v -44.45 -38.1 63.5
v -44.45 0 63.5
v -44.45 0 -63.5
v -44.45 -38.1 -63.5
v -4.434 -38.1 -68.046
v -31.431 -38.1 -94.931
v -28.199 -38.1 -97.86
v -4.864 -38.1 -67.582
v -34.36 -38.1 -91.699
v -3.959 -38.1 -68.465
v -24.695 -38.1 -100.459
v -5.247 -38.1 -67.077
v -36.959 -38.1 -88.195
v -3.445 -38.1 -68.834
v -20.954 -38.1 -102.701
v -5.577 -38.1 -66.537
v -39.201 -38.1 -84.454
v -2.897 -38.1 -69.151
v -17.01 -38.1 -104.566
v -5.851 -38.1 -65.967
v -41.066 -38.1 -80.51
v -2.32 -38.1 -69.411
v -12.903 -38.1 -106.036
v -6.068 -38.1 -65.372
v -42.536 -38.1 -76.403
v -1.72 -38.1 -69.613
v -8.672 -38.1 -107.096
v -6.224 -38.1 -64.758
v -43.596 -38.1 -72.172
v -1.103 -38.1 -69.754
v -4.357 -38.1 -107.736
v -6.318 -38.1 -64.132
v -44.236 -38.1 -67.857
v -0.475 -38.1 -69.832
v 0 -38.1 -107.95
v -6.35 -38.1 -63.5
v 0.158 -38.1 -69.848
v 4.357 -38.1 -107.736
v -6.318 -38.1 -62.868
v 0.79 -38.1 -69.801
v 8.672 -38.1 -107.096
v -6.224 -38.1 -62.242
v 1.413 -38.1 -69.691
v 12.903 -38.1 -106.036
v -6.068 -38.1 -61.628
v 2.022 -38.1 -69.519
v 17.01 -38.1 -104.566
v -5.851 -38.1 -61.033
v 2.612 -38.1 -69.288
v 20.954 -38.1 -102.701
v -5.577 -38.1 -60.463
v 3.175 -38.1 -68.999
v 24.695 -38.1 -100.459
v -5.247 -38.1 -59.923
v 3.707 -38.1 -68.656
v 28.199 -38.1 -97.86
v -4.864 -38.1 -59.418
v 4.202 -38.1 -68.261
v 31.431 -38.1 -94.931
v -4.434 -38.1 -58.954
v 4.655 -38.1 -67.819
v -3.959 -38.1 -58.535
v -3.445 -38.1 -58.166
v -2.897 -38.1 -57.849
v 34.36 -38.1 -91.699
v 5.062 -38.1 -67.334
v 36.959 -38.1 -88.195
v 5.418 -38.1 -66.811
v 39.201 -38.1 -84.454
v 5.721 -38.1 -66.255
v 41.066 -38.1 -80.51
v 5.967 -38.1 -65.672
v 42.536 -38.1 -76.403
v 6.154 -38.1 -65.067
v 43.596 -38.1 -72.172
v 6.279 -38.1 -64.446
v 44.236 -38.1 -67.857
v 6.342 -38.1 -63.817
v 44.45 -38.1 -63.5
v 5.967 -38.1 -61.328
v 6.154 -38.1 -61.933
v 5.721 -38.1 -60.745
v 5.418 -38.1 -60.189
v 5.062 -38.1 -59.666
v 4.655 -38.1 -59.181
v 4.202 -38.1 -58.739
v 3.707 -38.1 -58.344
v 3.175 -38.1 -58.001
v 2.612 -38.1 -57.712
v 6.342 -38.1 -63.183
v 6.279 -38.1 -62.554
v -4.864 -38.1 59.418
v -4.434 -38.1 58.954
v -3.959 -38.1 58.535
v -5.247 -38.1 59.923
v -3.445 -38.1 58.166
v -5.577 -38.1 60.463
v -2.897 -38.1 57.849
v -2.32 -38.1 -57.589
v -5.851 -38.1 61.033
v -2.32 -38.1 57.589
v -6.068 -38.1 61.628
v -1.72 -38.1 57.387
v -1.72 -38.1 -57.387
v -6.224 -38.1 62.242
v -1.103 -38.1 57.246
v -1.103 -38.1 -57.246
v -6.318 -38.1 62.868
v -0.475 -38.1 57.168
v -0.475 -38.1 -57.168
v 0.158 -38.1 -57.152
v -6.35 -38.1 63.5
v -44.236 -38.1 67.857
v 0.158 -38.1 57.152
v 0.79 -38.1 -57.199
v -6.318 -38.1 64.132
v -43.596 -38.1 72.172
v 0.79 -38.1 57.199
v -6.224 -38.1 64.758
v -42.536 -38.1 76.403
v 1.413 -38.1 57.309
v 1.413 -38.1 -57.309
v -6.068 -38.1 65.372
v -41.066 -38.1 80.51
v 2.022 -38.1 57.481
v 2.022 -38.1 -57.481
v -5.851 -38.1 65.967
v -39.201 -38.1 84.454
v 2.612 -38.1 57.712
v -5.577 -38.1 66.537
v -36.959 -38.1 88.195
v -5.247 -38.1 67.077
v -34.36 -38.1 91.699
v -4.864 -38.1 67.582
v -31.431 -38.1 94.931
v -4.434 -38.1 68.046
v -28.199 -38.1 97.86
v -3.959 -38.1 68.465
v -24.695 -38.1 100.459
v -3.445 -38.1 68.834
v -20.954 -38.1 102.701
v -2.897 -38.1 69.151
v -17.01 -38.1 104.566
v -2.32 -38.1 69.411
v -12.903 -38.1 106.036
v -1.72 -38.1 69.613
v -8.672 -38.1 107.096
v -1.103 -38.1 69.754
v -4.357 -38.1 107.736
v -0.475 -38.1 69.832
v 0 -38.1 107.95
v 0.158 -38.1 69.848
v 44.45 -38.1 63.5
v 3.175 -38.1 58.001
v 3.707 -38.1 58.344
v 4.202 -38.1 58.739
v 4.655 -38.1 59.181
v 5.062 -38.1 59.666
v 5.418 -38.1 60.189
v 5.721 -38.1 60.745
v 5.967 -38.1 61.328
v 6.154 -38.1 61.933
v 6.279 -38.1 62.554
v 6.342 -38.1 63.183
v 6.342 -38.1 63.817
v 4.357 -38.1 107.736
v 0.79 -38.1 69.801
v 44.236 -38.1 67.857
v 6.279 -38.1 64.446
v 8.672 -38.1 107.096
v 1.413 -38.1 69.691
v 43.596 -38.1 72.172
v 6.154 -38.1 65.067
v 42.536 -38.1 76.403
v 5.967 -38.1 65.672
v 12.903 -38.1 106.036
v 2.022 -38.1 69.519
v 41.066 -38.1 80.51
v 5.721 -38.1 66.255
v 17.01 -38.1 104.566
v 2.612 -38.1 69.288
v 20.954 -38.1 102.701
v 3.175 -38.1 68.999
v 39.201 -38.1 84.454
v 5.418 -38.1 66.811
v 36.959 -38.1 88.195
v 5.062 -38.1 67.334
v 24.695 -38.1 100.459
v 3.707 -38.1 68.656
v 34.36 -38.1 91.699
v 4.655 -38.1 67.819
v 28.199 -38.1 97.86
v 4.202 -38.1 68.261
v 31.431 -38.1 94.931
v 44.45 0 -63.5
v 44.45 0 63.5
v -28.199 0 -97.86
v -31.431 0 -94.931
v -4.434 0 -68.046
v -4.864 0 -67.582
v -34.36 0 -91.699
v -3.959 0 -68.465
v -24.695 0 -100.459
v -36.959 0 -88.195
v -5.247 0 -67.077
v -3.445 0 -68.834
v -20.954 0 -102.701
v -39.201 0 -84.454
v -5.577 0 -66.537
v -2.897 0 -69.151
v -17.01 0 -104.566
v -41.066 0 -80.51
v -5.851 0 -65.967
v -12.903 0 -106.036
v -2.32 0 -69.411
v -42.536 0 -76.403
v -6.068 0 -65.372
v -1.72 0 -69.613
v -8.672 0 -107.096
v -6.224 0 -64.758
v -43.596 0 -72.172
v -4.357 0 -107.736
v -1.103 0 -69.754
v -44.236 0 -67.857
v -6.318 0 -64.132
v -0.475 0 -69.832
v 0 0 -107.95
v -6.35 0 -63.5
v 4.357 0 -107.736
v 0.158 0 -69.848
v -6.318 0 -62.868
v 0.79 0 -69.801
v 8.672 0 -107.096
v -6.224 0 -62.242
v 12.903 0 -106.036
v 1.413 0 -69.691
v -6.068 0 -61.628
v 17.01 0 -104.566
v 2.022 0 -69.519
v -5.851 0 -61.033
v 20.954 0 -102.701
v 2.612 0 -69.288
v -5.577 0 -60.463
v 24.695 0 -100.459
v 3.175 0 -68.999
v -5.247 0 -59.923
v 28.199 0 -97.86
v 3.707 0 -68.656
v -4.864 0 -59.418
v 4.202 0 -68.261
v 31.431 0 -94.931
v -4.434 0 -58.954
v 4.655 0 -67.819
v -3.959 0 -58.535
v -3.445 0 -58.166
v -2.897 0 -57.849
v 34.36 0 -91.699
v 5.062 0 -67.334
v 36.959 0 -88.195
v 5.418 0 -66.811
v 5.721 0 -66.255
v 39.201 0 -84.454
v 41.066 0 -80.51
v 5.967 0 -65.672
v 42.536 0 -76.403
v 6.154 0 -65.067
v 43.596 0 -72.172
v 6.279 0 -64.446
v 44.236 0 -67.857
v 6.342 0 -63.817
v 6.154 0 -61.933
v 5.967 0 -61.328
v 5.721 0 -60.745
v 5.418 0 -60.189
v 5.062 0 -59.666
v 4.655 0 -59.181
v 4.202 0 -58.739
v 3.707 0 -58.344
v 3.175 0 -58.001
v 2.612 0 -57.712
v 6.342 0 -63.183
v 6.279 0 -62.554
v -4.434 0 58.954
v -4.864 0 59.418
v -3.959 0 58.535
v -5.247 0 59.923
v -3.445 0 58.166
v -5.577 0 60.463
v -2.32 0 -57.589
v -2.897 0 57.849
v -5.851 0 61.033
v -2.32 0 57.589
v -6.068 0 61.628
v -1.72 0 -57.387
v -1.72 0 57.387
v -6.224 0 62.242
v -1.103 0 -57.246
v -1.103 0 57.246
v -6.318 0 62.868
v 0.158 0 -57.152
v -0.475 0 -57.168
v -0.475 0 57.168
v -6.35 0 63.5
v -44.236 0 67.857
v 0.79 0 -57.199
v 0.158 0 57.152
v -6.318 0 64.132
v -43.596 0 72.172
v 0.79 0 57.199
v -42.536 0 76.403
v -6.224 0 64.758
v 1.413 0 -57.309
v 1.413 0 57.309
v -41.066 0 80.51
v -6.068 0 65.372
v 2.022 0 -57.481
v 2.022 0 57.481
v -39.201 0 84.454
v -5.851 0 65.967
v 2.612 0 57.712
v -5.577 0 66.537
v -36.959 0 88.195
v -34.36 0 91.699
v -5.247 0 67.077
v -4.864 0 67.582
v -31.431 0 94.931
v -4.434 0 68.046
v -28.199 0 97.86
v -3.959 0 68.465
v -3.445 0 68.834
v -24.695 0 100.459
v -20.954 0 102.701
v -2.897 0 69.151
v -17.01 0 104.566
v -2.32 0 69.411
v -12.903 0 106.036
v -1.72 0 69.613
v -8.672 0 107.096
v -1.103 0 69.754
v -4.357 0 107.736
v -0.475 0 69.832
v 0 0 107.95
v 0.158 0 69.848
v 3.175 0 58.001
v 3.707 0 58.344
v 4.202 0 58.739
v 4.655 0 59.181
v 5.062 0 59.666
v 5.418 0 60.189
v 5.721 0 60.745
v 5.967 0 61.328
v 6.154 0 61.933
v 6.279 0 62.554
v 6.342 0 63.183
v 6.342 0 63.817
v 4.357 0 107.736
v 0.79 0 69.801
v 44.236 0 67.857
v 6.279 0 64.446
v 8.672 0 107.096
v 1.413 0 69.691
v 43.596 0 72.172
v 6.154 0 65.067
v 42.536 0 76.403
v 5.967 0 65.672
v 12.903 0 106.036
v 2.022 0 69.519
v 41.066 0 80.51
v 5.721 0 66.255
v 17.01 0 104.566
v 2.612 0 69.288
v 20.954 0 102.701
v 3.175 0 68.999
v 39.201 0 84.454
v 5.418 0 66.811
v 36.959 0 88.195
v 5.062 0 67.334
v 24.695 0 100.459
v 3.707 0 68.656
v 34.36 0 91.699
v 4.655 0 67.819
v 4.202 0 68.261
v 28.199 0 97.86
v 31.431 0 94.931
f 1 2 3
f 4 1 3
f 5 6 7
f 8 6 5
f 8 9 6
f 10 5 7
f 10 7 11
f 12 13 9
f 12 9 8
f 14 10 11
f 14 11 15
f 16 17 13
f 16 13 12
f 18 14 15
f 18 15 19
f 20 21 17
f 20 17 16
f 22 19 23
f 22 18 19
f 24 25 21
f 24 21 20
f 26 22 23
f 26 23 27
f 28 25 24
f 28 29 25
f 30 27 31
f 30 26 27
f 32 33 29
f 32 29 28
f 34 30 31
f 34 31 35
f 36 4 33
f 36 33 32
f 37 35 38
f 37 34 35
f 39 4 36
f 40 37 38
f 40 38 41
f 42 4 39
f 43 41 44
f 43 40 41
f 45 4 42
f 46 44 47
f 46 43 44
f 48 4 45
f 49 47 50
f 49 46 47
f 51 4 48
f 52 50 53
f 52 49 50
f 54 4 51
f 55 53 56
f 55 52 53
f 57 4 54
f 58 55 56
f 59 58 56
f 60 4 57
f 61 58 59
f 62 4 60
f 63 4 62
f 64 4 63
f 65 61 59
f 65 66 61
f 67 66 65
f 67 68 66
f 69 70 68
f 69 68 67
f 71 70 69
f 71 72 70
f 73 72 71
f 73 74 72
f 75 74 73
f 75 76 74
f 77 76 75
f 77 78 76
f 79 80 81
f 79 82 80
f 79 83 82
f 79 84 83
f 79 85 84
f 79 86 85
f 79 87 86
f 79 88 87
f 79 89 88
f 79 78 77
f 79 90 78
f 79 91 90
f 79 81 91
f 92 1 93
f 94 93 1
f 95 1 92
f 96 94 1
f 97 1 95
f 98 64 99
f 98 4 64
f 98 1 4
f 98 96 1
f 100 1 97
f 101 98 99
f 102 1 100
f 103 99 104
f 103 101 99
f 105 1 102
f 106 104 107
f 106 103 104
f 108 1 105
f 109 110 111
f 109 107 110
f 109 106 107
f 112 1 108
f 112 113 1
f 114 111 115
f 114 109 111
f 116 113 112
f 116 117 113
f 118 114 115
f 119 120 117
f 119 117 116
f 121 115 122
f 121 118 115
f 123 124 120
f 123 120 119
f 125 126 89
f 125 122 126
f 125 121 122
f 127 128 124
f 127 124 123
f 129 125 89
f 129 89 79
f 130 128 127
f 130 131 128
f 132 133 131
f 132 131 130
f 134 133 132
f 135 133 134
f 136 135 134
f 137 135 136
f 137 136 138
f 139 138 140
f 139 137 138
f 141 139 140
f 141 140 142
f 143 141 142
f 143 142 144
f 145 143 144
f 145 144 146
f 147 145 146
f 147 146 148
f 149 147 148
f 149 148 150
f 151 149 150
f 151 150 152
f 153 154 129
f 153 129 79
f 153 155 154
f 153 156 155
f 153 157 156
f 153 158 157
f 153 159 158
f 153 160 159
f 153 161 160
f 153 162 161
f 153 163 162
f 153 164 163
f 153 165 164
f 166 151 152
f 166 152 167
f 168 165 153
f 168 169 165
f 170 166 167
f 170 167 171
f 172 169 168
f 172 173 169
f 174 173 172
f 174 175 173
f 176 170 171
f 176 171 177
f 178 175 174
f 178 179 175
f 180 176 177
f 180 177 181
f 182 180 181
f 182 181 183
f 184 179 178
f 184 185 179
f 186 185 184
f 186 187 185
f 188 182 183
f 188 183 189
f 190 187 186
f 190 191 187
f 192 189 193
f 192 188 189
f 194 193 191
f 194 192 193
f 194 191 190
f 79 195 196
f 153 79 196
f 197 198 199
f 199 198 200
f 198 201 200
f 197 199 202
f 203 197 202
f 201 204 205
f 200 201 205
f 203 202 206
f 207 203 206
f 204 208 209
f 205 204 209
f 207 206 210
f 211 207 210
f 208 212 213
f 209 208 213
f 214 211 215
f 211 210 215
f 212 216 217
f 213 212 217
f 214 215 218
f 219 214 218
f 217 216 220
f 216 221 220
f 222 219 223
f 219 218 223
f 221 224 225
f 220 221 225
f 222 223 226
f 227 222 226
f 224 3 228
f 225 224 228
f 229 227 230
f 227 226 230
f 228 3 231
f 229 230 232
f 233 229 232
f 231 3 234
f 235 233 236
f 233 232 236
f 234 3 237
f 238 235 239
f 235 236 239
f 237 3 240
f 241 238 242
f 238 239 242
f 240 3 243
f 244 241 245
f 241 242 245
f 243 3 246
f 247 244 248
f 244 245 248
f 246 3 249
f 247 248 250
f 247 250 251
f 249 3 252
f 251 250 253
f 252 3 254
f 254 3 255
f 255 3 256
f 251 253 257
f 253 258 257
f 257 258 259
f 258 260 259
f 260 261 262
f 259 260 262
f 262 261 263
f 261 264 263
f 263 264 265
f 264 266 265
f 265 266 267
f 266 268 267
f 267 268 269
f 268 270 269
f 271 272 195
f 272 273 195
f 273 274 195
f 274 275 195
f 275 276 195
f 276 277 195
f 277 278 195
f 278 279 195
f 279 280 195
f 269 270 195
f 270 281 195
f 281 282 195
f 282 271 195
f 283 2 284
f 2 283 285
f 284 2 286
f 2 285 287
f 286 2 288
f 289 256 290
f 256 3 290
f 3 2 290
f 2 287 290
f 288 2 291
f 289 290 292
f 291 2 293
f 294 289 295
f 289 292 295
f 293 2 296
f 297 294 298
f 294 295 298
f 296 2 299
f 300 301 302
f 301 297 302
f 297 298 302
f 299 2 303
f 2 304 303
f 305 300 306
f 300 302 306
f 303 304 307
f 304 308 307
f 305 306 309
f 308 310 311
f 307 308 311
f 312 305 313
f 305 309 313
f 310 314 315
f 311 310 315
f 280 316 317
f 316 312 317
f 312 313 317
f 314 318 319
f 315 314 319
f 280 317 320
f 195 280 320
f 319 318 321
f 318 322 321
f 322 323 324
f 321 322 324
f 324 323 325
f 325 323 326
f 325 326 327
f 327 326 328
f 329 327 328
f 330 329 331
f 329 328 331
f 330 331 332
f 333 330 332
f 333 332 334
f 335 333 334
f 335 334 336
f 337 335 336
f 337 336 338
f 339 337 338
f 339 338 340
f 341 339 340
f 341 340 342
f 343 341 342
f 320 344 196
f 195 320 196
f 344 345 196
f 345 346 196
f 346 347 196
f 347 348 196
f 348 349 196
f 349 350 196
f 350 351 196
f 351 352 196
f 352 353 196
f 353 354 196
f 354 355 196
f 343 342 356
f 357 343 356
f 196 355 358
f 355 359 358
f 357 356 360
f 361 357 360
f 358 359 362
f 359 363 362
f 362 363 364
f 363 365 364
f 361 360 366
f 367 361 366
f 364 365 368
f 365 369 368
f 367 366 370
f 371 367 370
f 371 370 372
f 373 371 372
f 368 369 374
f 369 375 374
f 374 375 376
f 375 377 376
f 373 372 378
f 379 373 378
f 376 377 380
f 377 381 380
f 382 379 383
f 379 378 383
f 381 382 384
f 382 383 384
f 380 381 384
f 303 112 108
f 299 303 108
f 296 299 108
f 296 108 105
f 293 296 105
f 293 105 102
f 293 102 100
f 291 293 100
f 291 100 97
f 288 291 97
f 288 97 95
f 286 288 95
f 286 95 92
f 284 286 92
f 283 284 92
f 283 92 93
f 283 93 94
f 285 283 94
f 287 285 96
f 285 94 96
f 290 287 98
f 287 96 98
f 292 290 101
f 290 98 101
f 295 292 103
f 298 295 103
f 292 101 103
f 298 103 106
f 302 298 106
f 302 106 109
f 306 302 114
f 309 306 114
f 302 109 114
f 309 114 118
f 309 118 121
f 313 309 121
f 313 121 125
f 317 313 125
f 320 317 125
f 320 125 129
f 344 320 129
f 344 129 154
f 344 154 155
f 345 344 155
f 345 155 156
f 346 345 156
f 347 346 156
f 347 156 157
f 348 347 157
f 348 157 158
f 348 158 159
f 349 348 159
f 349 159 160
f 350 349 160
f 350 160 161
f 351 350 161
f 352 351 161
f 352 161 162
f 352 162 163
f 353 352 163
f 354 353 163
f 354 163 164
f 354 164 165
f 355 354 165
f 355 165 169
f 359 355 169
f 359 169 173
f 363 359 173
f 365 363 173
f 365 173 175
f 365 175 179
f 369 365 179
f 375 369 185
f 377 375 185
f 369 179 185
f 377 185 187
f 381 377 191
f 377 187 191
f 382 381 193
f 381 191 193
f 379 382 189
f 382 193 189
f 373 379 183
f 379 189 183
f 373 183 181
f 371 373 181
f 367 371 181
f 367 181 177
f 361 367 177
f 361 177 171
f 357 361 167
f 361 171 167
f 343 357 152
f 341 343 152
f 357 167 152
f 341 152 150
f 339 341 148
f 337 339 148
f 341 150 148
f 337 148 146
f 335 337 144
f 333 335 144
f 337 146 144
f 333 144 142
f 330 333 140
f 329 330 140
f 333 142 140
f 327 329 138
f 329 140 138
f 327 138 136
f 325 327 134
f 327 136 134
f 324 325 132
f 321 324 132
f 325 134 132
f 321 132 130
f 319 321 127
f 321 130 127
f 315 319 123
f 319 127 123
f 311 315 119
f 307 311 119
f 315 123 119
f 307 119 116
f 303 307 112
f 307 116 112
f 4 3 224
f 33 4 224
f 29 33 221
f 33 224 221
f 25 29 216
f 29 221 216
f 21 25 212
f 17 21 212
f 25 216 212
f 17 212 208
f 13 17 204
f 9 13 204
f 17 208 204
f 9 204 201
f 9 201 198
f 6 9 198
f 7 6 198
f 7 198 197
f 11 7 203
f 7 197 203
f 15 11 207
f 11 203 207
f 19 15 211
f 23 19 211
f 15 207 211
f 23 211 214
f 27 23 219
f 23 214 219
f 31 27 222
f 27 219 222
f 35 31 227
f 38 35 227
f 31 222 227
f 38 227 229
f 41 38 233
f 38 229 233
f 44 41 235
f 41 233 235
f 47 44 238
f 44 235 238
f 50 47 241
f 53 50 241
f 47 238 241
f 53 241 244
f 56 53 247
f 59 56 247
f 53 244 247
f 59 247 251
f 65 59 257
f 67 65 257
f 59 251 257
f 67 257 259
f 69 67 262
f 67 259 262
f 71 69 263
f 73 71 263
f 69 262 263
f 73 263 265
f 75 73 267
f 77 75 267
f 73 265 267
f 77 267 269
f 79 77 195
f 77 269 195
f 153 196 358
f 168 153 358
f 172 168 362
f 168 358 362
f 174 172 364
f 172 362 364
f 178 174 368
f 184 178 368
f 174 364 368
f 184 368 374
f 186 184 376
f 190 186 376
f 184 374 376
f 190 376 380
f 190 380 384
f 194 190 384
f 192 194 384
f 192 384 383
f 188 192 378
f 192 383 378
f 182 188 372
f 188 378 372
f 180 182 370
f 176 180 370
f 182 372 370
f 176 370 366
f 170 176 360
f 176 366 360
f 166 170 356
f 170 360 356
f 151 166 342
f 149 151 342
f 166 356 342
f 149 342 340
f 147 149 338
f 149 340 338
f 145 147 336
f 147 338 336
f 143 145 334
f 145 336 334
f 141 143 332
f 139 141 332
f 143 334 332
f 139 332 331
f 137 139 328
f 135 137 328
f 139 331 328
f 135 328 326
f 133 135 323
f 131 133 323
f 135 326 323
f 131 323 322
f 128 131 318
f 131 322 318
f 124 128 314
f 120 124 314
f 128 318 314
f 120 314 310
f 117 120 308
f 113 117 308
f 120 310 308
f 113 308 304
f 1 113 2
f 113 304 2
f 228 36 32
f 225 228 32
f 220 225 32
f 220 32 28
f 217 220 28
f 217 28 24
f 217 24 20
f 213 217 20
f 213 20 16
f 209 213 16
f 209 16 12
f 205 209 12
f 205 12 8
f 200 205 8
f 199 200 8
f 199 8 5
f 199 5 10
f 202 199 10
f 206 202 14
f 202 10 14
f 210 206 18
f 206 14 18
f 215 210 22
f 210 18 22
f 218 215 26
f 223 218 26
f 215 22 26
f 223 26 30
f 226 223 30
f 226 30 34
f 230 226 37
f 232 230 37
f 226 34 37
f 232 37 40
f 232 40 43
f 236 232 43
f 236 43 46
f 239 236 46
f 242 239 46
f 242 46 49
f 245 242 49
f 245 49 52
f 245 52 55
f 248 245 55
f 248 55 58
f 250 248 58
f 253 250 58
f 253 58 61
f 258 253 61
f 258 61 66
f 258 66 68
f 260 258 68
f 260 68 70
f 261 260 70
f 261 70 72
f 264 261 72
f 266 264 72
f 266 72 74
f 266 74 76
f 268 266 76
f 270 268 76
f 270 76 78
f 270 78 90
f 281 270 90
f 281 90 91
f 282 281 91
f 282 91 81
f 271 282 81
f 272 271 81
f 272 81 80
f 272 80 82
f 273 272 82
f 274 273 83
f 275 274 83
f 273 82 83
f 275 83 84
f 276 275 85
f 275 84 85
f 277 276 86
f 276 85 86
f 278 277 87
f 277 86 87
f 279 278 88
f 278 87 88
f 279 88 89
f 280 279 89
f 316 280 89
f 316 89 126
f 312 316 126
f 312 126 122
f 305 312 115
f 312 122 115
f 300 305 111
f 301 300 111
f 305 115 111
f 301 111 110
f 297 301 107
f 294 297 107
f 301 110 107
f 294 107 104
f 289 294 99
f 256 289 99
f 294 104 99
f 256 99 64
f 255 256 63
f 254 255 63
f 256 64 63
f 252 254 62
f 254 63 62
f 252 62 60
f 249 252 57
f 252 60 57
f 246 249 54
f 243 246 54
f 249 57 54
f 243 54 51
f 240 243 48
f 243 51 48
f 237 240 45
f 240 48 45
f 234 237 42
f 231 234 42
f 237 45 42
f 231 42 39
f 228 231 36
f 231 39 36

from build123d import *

# Parameters (mm, degrees)
F1_DEPTH = 38.1
F2_D     = 12.7


# Not quite as in the source:
# - a length typed as a fraction of an inch, garbled in the dataset ("3 / 203.2 mm" for 3/8 in), is restored


with BuildPart() as f1:
    # F0 (on Front) → F1 (new body)
    with BuildSketch(Plane.XZ):
        with BuildLine():
            Line((44.45, -63.5), (44.45, 63.5))
            ThreePointArc((44.45, 63.5), (0, 107.95), (-44.45, 63.5))
            Line((-44.45, 63.5), (-44.45, -63.5))
            ThreePointArc((-44.45, -63.5), (0, -107.95), (44.45, -63.5))
        make_face()
    extrude(amount=F1_DEPTH)

    # F2 (through all)
    with Locations(Plane(origin=(0, 0, 0), x_dir=(1, 0, 0), z_dir=(0, 1, 0))):
        with Locations((0, -63.5), (0, 63.5)):
            Hole(F2_D / 2)


solid = f1.part
